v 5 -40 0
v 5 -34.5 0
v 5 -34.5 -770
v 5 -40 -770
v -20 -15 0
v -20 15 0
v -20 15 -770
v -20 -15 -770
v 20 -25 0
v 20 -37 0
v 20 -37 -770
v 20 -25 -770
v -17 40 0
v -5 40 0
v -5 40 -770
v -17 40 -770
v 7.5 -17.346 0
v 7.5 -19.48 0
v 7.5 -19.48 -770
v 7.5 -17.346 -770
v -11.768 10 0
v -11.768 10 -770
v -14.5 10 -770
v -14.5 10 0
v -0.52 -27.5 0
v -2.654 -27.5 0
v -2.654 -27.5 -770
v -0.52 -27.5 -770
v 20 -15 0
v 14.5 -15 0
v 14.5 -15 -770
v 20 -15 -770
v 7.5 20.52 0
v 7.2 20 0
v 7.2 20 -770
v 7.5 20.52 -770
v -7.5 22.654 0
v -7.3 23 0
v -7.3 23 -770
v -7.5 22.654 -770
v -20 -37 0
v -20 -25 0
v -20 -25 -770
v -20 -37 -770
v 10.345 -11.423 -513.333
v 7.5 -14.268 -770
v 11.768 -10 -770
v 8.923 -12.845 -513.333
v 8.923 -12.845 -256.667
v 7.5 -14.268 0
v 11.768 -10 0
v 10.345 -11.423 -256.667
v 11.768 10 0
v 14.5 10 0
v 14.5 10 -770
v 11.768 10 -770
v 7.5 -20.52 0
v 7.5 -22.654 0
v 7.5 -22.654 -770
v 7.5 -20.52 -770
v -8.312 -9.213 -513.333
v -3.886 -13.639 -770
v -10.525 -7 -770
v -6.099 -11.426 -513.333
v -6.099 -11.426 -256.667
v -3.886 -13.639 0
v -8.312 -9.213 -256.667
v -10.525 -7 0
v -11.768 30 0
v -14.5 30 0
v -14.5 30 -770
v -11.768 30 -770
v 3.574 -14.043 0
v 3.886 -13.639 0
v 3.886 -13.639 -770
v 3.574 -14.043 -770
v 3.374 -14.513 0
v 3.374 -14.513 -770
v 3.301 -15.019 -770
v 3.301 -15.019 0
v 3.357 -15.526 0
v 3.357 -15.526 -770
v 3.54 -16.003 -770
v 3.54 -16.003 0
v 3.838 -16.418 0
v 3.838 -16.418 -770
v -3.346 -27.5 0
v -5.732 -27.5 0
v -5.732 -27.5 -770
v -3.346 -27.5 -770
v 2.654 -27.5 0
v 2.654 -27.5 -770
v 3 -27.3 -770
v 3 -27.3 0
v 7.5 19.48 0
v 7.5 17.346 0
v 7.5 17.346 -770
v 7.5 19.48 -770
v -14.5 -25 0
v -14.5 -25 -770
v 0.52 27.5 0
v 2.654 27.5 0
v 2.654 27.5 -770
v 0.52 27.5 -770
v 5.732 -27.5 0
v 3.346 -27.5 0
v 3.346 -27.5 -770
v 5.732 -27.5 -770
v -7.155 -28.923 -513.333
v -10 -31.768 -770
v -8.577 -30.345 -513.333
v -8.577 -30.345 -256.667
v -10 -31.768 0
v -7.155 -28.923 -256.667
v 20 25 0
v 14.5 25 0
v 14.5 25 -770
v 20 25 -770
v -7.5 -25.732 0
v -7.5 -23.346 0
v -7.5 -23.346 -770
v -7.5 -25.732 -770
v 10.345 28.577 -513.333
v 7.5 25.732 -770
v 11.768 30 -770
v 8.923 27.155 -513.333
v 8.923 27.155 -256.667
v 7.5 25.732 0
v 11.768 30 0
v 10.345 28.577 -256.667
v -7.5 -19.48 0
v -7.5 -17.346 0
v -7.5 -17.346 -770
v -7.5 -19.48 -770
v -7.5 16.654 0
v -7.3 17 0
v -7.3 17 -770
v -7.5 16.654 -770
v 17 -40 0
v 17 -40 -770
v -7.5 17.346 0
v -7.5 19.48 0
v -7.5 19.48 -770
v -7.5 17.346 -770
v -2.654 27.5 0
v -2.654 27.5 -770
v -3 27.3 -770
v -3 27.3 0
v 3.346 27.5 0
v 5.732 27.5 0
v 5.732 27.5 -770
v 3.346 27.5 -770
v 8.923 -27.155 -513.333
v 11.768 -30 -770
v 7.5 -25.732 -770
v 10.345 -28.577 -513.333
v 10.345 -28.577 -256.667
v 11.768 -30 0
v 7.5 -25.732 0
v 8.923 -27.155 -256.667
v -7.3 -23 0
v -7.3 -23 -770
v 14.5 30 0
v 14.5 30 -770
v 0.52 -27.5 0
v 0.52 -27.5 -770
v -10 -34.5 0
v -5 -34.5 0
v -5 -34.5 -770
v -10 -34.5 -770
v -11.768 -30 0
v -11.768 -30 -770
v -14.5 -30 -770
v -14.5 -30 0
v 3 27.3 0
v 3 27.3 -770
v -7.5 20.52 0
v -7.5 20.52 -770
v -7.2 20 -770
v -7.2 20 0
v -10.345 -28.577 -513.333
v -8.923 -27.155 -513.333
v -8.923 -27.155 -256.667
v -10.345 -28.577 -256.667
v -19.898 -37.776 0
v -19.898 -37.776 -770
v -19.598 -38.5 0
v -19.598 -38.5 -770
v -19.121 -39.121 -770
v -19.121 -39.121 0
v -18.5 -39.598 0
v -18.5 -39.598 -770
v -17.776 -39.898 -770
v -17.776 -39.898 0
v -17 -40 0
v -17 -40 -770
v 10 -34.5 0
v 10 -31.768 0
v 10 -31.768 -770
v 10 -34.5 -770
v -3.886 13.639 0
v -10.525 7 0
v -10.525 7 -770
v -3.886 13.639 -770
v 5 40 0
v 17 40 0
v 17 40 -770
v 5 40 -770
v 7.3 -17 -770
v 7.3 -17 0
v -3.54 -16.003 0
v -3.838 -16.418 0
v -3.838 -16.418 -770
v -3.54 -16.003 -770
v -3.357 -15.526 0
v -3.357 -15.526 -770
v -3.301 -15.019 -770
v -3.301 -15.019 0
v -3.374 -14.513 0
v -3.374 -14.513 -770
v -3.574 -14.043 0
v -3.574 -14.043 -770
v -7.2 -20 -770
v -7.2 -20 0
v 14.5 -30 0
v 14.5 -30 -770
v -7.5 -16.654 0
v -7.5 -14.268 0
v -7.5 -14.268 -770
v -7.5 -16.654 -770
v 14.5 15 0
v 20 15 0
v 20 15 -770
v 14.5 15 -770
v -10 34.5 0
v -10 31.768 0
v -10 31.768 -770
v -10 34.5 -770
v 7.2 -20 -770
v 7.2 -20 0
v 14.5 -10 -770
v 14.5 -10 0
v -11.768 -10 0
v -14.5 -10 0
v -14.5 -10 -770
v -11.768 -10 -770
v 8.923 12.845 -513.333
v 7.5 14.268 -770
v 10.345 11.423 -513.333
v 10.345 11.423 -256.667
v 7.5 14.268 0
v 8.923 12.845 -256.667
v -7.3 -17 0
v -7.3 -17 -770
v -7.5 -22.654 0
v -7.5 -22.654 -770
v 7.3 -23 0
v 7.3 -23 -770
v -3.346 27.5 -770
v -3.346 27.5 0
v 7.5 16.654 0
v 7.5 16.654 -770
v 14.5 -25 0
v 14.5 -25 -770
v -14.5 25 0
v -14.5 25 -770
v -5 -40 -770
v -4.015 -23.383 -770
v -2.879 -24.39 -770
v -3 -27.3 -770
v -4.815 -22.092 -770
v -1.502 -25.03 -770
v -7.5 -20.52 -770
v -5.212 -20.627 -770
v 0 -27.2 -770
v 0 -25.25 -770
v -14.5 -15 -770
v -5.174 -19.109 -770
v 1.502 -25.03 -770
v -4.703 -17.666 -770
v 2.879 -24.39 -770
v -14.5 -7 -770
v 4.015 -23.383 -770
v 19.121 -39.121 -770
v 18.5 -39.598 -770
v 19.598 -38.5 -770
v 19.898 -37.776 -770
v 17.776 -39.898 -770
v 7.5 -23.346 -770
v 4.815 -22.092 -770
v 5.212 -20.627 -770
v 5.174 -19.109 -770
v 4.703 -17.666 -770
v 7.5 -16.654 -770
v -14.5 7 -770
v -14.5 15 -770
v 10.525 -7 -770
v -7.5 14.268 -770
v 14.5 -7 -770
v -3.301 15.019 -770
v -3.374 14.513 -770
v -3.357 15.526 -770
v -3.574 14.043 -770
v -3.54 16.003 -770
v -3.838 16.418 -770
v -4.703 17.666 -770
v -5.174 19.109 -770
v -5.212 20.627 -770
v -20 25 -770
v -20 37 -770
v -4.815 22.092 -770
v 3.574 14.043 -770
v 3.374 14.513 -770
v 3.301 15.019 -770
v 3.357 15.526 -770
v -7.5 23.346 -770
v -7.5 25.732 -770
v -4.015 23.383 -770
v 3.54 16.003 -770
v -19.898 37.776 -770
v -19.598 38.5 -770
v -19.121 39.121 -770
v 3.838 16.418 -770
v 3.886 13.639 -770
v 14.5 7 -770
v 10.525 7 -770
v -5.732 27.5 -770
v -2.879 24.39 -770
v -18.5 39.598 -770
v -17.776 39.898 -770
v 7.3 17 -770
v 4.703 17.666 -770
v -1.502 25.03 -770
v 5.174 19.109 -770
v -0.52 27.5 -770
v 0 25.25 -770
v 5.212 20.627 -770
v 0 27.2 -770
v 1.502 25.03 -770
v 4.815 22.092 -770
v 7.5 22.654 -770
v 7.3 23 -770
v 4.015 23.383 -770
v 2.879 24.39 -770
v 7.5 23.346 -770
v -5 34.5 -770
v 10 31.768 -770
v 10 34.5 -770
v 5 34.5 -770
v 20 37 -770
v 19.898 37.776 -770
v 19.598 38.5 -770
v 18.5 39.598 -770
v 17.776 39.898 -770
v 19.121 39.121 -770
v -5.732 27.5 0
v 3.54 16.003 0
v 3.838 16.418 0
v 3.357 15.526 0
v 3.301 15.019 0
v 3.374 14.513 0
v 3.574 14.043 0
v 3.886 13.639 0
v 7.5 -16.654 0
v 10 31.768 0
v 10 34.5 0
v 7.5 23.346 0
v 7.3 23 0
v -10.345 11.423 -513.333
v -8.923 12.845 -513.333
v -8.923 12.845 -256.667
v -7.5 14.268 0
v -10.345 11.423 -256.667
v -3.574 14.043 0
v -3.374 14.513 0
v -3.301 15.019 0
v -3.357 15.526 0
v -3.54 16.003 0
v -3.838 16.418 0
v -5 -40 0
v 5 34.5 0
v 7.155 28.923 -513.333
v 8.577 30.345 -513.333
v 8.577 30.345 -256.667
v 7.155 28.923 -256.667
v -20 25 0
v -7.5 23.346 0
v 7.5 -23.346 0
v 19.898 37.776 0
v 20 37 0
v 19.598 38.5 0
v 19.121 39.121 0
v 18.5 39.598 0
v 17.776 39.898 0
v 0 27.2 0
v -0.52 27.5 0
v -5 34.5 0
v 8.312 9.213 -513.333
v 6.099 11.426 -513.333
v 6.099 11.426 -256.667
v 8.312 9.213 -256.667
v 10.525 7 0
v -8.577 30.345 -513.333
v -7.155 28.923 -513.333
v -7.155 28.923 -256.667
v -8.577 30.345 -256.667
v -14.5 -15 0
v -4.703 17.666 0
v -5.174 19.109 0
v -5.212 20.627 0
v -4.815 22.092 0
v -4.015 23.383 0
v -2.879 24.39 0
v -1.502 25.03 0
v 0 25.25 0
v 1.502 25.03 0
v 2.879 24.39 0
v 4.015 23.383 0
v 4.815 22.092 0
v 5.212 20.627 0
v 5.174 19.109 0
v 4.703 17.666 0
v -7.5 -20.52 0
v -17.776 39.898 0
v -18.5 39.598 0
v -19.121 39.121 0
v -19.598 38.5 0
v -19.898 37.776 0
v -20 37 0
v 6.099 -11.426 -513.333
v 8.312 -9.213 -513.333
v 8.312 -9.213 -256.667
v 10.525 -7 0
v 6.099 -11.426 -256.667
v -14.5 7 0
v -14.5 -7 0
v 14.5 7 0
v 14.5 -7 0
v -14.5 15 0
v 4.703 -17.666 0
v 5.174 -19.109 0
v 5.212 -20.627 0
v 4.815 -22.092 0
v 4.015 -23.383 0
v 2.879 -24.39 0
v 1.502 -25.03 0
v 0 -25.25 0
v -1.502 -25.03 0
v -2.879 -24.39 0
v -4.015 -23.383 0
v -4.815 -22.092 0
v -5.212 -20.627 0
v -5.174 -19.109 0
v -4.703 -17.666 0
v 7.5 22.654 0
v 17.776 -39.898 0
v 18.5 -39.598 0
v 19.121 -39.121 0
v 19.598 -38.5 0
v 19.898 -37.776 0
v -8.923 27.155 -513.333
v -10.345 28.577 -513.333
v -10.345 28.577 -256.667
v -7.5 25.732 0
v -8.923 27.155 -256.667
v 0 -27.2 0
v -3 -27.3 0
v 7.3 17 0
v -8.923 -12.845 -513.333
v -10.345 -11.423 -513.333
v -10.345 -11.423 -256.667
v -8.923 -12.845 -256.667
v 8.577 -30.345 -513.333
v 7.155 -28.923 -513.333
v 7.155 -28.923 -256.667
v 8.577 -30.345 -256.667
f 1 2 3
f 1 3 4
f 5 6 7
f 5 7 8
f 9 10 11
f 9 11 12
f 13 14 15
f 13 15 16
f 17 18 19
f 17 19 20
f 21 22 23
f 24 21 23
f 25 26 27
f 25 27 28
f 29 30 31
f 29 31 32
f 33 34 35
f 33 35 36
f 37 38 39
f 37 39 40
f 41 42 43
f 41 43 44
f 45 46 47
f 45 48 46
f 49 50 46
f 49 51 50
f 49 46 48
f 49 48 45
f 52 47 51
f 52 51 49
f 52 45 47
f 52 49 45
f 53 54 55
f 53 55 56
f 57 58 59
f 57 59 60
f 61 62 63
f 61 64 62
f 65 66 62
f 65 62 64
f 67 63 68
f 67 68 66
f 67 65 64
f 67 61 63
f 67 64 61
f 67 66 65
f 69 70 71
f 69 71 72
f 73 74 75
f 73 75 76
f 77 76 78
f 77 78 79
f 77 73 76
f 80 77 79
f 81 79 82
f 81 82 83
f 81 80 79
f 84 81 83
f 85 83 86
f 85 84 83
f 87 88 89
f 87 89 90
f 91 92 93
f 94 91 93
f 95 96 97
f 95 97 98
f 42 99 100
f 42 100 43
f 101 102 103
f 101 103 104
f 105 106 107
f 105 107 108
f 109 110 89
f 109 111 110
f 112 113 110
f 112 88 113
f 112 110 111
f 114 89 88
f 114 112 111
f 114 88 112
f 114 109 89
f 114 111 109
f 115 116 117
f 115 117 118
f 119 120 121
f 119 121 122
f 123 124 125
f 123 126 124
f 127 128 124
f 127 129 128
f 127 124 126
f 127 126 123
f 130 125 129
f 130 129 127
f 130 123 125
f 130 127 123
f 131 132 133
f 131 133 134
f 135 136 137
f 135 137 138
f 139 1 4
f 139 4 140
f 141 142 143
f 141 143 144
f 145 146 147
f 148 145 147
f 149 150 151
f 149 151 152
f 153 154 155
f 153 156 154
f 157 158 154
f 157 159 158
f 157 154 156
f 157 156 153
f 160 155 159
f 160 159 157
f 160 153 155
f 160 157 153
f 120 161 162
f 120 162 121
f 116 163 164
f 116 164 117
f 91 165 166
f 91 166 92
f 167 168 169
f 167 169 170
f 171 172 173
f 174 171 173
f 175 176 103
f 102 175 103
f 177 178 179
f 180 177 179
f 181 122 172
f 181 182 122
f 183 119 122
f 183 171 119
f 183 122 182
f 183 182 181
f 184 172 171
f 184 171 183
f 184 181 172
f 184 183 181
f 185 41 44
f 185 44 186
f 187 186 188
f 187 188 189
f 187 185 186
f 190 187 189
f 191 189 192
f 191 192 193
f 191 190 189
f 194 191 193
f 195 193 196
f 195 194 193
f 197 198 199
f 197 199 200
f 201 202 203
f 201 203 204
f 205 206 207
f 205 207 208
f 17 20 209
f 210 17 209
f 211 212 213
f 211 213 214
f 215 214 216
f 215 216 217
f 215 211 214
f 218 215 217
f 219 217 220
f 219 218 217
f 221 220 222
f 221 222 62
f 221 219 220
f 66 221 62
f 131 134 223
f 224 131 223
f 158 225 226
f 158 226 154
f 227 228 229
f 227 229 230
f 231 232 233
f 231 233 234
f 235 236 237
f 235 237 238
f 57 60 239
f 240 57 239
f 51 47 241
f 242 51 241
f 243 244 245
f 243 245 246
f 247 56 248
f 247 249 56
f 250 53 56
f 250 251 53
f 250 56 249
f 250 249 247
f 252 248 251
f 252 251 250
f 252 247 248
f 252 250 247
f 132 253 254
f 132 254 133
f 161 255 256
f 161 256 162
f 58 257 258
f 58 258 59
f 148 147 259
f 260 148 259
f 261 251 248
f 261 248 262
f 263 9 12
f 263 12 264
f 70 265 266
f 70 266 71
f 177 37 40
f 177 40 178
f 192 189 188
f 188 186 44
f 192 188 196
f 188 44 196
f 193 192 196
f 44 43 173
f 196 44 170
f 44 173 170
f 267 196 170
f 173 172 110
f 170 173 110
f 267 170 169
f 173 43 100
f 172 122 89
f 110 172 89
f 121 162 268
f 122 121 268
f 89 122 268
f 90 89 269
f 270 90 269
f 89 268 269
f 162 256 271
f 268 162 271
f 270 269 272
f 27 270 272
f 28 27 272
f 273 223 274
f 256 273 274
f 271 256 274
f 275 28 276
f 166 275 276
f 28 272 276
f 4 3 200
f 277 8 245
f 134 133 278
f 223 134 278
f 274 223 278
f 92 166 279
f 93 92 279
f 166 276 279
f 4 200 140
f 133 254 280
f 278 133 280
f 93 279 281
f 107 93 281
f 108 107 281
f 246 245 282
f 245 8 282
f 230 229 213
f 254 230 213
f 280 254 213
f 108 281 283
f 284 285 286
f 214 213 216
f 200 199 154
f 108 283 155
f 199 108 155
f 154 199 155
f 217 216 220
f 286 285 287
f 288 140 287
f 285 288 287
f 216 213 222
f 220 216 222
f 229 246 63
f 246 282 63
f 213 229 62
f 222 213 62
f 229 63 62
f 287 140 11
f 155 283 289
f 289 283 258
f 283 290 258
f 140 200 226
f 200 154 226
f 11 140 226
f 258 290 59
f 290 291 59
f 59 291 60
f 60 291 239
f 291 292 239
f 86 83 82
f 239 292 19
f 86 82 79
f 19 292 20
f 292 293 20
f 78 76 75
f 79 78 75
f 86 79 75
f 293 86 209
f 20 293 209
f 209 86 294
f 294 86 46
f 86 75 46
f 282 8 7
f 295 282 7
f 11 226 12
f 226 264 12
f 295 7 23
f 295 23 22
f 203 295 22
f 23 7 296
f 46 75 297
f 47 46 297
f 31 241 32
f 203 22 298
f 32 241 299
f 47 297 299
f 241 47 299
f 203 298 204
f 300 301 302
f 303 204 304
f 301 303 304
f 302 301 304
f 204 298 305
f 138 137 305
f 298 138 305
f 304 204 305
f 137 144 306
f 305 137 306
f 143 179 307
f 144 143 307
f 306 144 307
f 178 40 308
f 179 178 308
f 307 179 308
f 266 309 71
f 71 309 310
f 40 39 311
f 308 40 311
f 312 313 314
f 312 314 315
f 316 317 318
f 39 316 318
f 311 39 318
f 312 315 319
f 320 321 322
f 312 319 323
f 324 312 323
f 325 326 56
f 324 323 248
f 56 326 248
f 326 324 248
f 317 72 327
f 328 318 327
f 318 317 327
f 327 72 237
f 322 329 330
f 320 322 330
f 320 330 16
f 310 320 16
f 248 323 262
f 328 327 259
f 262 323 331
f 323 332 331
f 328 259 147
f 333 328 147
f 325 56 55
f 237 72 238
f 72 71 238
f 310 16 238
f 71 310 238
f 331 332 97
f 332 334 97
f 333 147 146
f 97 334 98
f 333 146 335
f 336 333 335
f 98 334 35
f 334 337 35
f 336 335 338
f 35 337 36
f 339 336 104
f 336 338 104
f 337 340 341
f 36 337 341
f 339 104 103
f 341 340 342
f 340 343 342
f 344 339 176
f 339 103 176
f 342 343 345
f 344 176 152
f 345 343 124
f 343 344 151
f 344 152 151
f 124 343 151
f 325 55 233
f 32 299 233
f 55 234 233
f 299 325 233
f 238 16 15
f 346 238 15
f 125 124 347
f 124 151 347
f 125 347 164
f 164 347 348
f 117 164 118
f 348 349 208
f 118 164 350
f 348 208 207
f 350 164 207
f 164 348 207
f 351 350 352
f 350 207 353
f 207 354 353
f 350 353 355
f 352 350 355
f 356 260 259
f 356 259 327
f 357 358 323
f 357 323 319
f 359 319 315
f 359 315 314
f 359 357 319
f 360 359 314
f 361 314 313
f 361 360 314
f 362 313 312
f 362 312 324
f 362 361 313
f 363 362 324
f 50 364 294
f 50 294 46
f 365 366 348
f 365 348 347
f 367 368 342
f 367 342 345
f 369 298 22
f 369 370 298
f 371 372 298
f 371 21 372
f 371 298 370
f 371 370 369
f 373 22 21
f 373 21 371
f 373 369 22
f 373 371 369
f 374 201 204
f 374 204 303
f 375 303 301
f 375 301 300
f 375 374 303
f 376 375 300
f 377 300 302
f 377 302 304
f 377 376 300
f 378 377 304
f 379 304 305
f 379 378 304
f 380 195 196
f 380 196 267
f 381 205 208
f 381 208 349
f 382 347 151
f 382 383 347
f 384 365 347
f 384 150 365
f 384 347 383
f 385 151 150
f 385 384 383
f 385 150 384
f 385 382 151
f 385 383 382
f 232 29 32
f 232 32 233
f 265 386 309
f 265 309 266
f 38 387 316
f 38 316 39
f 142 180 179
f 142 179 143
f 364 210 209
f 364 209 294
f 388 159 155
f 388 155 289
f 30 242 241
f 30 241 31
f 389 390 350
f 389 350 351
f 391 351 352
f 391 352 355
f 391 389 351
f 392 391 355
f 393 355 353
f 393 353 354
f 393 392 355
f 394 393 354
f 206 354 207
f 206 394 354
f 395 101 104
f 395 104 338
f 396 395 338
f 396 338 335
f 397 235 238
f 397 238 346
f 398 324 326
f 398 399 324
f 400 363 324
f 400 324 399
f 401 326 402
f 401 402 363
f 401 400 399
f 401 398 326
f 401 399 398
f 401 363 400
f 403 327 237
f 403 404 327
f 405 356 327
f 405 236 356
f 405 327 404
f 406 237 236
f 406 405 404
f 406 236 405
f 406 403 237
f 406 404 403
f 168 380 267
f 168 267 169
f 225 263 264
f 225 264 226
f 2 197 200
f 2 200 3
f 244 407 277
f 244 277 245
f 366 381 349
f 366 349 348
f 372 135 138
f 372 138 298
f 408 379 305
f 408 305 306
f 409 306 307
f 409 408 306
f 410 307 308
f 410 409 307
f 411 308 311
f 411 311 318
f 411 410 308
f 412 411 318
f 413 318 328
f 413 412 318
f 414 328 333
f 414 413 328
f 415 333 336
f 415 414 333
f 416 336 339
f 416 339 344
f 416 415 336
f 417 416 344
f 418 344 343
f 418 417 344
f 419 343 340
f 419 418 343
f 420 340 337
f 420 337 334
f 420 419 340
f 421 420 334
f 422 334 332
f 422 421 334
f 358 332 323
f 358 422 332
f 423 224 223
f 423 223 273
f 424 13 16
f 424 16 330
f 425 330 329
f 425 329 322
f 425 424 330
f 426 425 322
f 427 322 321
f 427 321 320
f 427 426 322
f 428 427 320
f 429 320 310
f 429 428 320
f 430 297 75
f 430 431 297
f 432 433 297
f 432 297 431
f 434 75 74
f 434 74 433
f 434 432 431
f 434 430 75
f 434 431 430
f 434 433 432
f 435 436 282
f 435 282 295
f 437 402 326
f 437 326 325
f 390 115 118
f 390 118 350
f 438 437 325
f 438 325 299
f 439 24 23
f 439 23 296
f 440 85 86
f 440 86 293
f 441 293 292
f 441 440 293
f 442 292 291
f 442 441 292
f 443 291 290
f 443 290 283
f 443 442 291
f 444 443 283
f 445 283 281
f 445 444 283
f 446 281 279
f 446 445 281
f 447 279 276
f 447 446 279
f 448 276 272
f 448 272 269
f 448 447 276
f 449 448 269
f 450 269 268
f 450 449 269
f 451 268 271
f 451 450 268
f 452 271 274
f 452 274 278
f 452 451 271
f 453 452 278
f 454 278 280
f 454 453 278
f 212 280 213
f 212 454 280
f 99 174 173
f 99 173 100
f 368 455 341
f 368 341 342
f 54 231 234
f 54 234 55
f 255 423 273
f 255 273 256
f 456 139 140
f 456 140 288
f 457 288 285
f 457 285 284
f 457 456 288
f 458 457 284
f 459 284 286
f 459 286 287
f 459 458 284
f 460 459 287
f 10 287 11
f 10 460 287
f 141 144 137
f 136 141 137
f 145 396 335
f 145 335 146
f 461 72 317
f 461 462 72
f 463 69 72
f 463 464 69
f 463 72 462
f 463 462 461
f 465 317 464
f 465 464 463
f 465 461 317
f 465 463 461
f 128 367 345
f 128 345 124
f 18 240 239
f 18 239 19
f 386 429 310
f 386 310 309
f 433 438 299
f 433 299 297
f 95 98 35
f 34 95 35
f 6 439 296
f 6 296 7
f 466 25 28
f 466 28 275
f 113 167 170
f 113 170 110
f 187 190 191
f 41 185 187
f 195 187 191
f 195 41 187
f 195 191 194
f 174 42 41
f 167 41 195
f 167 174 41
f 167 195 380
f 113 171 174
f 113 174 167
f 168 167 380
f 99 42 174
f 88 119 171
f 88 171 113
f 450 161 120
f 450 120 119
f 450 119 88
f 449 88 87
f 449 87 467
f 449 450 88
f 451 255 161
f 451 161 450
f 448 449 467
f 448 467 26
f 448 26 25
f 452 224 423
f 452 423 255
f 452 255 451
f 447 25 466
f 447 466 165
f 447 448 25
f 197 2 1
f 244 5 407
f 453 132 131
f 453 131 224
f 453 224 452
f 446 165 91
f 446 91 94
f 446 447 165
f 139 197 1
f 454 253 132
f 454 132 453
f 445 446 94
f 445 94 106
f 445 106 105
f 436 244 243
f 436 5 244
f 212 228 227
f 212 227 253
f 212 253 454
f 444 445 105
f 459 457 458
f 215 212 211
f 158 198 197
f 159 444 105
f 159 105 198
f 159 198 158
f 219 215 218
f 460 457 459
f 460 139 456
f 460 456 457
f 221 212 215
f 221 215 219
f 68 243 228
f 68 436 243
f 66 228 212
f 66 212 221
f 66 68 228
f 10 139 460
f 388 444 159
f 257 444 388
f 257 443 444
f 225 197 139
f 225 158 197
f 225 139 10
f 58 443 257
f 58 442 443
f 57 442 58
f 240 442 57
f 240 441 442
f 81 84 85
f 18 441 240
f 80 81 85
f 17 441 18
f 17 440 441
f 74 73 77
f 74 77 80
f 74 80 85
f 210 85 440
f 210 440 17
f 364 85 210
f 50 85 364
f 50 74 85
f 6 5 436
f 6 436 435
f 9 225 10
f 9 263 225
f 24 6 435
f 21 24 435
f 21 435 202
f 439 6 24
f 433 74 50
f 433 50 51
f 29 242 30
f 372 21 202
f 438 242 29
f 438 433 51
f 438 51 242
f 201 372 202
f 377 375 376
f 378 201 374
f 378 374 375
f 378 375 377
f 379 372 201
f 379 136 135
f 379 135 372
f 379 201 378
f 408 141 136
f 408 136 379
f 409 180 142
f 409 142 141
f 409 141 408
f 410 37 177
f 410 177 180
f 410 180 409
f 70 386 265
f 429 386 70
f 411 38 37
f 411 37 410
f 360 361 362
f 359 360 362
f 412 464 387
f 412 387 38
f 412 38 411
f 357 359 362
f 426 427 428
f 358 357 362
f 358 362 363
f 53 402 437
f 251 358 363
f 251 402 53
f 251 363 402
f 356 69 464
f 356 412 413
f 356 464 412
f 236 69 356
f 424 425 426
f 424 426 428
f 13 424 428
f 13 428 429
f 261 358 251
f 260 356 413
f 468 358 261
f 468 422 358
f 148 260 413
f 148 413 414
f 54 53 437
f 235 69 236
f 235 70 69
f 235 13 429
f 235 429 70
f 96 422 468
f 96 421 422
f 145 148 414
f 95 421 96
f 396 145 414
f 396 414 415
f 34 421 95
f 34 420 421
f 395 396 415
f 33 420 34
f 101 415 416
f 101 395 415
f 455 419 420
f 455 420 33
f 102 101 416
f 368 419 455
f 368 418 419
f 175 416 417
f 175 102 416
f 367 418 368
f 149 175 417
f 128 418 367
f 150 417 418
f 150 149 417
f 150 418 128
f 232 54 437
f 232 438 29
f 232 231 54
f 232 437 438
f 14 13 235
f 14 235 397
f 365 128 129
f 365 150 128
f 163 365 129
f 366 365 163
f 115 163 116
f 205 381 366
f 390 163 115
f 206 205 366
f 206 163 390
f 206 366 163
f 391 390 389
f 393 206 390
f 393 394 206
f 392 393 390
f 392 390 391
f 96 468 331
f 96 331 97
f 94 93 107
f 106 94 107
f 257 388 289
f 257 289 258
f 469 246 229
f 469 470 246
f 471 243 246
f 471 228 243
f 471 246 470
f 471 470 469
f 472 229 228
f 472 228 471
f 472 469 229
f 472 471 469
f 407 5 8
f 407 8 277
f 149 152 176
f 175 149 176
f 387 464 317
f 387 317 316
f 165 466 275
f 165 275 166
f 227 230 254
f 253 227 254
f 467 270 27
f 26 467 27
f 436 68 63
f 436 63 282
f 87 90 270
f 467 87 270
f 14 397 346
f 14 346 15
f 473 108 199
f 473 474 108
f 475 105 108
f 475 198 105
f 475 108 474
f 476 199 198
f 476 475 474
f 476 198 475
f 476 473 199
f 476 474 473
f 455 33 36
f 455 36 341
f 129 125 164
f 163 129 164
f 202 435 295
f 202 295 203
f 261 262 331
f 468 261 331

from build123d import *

# Parameters (mm, degrees)
BOSS_EXTRUDE1_DEPTH = 770


with BuildPart() as part:
    # Sketch1 → Boss-Extrude1 (new body)
    with BuildSketch(Plane.XY):
        with BuildLine():
            Line((-14.5, 10), (-14.5, 15))
            Line((-14.5, 15), (-20, 15))
            Line((-20, 15), (-20, -15))
            Line((-20, -15), (-14.5, -15))
            Line((-14.5, -15), (-14.5, -10))
            Line((-14.5, -10), (-11.767766953, -10))
            add(Edge.make_bspline(
                [(-11.767766953, -10), (-10.345177969, -11.422588984), (-8.922588984, -12.845177969), (-7.5, -14.267766953)],
                knots=[0, 0, 0, 0, 1, 1, 1, 1], degree=3))
            Line((-7.5, -14.267766953), (-7.5, -16.653589838))
            Line((-7.5, -16.653589838), (-7.300000072, -16.999999875))
            Line((-7.300000072, -16.999999875), (-7.5, -17.346410162))
            Line((-7.5, -17.346410162), (-7.5, -19.480384758))
            Line((-7.5, -19.480384758), (-7.200000072, -19.999999875))
            Line((-7.200000072, -19.999999875), (-7.5, -20.519615242))
            Line((-7.5, -20.519615242), (-7.5, -22.653589838))
            Line((-7.5, -22.653589838), (-7.3, -23))
            Line((-7.3, -23), (-7.5, -23.346410162))
            Line((-7.5, -23.346410162), (-7.5, -25.732233047))
            add(Edge.make_bspline(
                [(-7.5, -25.732233047), (-8.922588984, -27.154822031), (-10.345177969, -28.577411016), (-11.767766953, -30)],
                knots=[0, 0, 0, 0, 1, 1, 1, 1], degree=3))
            Line((-11.767766953, -30), (-14.5, -30))
            Line((-14.5, -30), (-14.5, -25))
            Line((-14.5, -25), (-20, -25))
            Line((-20, -25), (-20, -37))
            ThreePointArc((-20, -37), (-19.121320344, -39.121320344), (-17, -40))
            Line((-17, -40), (-5, -40))
            Line((-5, -40), (-5, -34.5))
            Line((-5, -34.5), (-10, -34.5))
            Line((-10, -34.5), (-10, -31.767766953))
            add(Edge.make_bspline(
                [(-10, -31.767766953), (-8.577411016, -30.345177969), (-7.154822031, -28.922588984), (-5.732233047, -27.5)],
                knots=[0, 0, 0, 0, 1, 1, 1, 1], degree=3))
            Line((-5.732233047, -27.5), (-3.346410162, -27.5))
            Line((-3.346410162, -27.5), (-3, -27.3))
            Line((-3, -27.3), (-2.653589838, -27.5))
            Line((-2.653589838, -27.5), (-0.519615242, -27.5))
            Line((-0.519615242, -27.5), (-2.17e-07, -27.200000125))
            Line((-2.17e-07, -27.200000125), (0.519615242, -27.5))
            Line((0.519615242, -27.5), (2.653589838, -27.5))
            Line((2.653589838, -27.5), (3, -27.3))
            Line((3, -27.3), (3.346410162, -27.5))
            Line((3.346410162, -27.5), (5.732233047, -27.5))
            add(Edge.make_bspline(
                [(5.732233047, -27.5), (7.154822031, -28.922588984), (8.577411016, -30.345177969), (10, -31.767766953)],
                knots=[0, 0, 0, 0, 1, 1, 1, 1], degree=3))
            Line((10, -31.767766953), (10, -34.5))
            Line((10, -34.5), (5, -34.5))
            Line((5, -34.5), (5, -40))
            Line((5, -40), (17, -40))
            ThreePointArc((17, -40), (19.121320344, -39.121320344), (20, -37))
            Line((20, -37), (20, -25))
            Line((20, -25), (14.5, -25))
            Line((14.5, -25), (14.5, -30))
            Line((14.5, -30), (11.767766953, -30))
            add(Edge.make_bspline(
                [(11.767766953, -30), (10.345177969, -28.577411016), (8.922588984, -27.154822031), (7.5, -25.732233047)],
                knots=[0, 0, 0, 0, 1, 1, 1, 1], degree=3))
            Line((7.5, -25.732233047), (7.5, -23.346410162))
            Line((7.5, -23.346410162), (7.3, -23))
            Line((7.3, -23), (7.5, -22.653589838))
            Line((7.5, -22.653589838), (7.5, -20.519615242))
            Line((7.5, -20.519615242), (7.200000072, -20.000000125))
            Line((7.200000072, -20.000000125), (7.5, -19.480384758))
            Line((7.5, -19.480384758), (7.5, -17.346410162))
            Line((7.5, -17.346410162), (7.300000072, -17.000000125))
            Line((7.300000072, -17.000000125), (7.5, -16.653589838))
            Line((7.5, -16.653589838), (7.5, -14.267766953))
            add(Edge.make_bspline(
                [(7.5, -14.267766953), (8.922588984, -12.845177969), (10.345177969, -11.422588984), (11.767766953, -10)],
                knots=[0, 0, 0, 0, 1, 1, 1, 1], degree=3))
            Line((11.767766953, -10), (14.5, -10))
            Line((14.5, -10), (14.5, -15))
            Line((14.5, -15), (20, -15))
            Line((20, -15), (20, 15))
            Line((20, 15), (14.5, 15))
            Line((14.5, 15), (14.5, 10))
            Line((14.5, 10), (11.767766953, 10))
            add(Edge.make_bspline(
                [(11.767766953, 10), (10.345177969, 11.422588984), (8.922588984, 12.845177969), (7.5, 14.267766953)],
                knots=[0, 0, 0, 0, 1, 1, 1, 1], degree=3))
            Line((7.5, 14.267766953), (7.5, 16.653589838))
            Line((7.5, 16.653589838), (7.300000072, 16.999999875))
            Line((7.300000072, 16.999999875), (7.5, 17.346410162))
            Line((7.5, 17.346410162), (7.5, 19.480384758))
            Line((7.5, 19.480384758), (7.200000072, 19.999999875))
            Line((7.200000072, 19.999999875), (7.5, 20.519615242))
            Line((7.5, 20.519615242), (7.5, 22.653589838))
            Line((7.5, 22.653589838), (7.3, 23))
            Line((7.3, 23), (7.5, 23.346410162))
            Line((7.5, 23.346410162), (7.5, 25.732233047))
            add(Edge.make_bspline(
                [(7.5, 25.732233047), (8.922588984, 27.154822031), (10.345177969, 28.577411016), (11.767766953, 30)],
                knots=[0, 0, 0, 0, 1, 1, 1, 1], degree=3))
            Line((11.767766953, 30), (14.5, 30))
            Line((14.5, 30), (14.5, 25))
            Line((14.5, 25), (20, 25))
            Line((20, 25), (20, 37))
            ThreePointArc((20, 37), (19.121320344, 39.121320344), (17, 40))
            Line((17, 40), (5, 40))
            Line((5, 40), (5, 34.5))
            Line((5, 34.5), (10, 34.5))
            Line((10, 34.5), (10, 31.767766953))
            add(Edge.make_bspline(
                [(10, 31.767766953), (8.577411016, 30.345177969), (7.154822031, 28.922588984), (5.732233047, 27.5)],
                knots=[0, 0, 0, 0, 1, 1, 1, 1], degree=3))
            Line((5.732233047, 27.5), (3.346410162, 27.5))
            Line((3.346410162, 27.5), (3, 27.3))
            Line((3, 27.3), (2.653589838, 27.5))
            Line((2.653589838, 27.5), (0.519615242, 27.5))
            Line((0.519615242, 27.5), (2.17e-07, 27.200000125))
            Line((2.17e-07, 27.200000125), (-0.519615242, 27.5))
            Line((-0.519615242, 27.5), (-2.653589838, 27.5))
            Line((-2.653589838, 27.5), (-3, 27.3))
            Line((-3, 27.3), (-3.346410162, 27.5))
            Line((-3.346410162, 27.5), (-5.732233047, 27.5))
            add(Edge.make_bspline(
                [(-5.732233047, 27.5), (-7.154822031, 28.922588984), (-8.577411016, 30.345177969), (-10, 31.767766953)],
                knots=[0, 0, 0, 0, 1, 1, 1, 1], degree=3))
            Line((-10, 31.767766953), (-10, 34.5))
            Line((-10, 34.5), (-5, 34.5))
            Line((-5, 34.5), (-5, 40))
            Line((-5, 40), (-17, 40))
            ThreePointArc((-17, 40), (-19.121320344, 39.121320344), (-20, 37))
            Line((-20, 37), (-20, 25))
            Line((-20, 25), (-14.5, 25))
            Line((-14.5, 25), (-14.5, 30))
            Line((-14.5, 30), (-11.767766953, 30))
            add(Edge.make_bspline(
                [(-11.767766953, 30), (-10.345177969, 28.577411016), (-8.922588984, 27.154822031), (-7.5, 25.732233047)],
                knots=[0, 0, 0, 0, 1, 1, 1, 1], degree=3))
            Line((-7.5, 25.732233047), (-7.5, 23.346410162))
            Line((-7.5, 23.346410162), (-7.3, 23))
            Line((-7.3, 23), (-7.5, 22.653589838))
            Line((-7.5, 22.653589838), (-7.5, 20.519615242))
            Line((-7.5, 20.519615242), (-7.200000072, 20.000000125))
            Line((-7.200000072, 20.000000125), (-7.5, 19.480384758))
            Line((-7.5, 19.480384758), (-7.5, 17.346410162))
            Line((-7.5, 17.346410162), (-7.300000072, 17.000000125))
            Line((-7.300000072, 17.000000125), (-7.5, 16.653589838))
            Line((-7.5, 16.653589838), (-7.5, 14.267766953))
            add(Edge.make_bspline(
                [(-7.5, 14.267766953), (-8.922588984, 12.845177969), (-10.345177969, 11.422588984), (-11.767766953, 10)],
                knots=[0, 0, 0, 0, 1, 1, 1, 1], degree=3))
            Line((-11.767766953, 10), (-14.5, 10))
        make_face()
        with BuildLine():
            Line((-10.525126266, -7), (-14.5, -7))
            Line((-14.5, -7), (-14.5, 7))
            Line((-14.5, 7), (-10.525126266, 7))
            Line((-10.525126266, 7), (-3.886038516, 13.63908775))
            ThreePointArc((-3.886038516, 13.63908775), (-3.300549454, 15.018813426), (-3.838113574, 16.417907847))
            ThreePointArc((-3.838113574, 16.417907847), (0, 25.25), (3.838113574, 16.417907847))
            ThreePointArc((3.838113574, 16.417907847), (3.300549454, 15.018813426), (3.886038516, 13.63908775))
            add(Edge.make_bspline(
                [(3.886038516, 13.63908775), (6.099067766, 11.4260585), (8.312097016, 9.21302925), (10.525126266, 7)],
                knots=[0, 0, 0, 0, 1, 1, 1, 1], degree=3))
            Line((10.525126266, 7), (14.5, 7))
            Line((14.5, 7), (14.5, -7))
            Line((14.5, -7), (10.525126266, -7))
            add(Edge.make_bspline(
                [(10.525126266, -7), (8.312097016, -9.21302925), (6.099067766, -11.4260585), (3.886038516, -13.63908775)],
                knots=[0, 0, 0, 0, 1, 1, 1, 1], degree=3))
            ThreePointArc((3.886038516, -13.63908775), (3.300549454, -15.018813426), (3.838113574, -16.417907847))
            ThreePointArc((3.838113574, -16.417907847), (0, -25.25), (-3.838113574, -16.417907847))
            ThreePointArc((-3.838113574, -16.417907847), (-3.300549454, -15.018813426), (-3.886038516, -13.63908775))
            add(Edge.make_bspline(
                [(-3.886038516, -13.63908775), (-6.099067766, -11.4260585), (-8.312097016, -9.21302925), (-10.525126266, -7)],
                knots=[0, 0, 0, 0, 1, 1, 1, 1], degree=3))
        make_face(mode=Mode.SUBTRACT)
    extrude(amount=-BOSS_EXTRUDE1_DEPTH)


solid = part.part
